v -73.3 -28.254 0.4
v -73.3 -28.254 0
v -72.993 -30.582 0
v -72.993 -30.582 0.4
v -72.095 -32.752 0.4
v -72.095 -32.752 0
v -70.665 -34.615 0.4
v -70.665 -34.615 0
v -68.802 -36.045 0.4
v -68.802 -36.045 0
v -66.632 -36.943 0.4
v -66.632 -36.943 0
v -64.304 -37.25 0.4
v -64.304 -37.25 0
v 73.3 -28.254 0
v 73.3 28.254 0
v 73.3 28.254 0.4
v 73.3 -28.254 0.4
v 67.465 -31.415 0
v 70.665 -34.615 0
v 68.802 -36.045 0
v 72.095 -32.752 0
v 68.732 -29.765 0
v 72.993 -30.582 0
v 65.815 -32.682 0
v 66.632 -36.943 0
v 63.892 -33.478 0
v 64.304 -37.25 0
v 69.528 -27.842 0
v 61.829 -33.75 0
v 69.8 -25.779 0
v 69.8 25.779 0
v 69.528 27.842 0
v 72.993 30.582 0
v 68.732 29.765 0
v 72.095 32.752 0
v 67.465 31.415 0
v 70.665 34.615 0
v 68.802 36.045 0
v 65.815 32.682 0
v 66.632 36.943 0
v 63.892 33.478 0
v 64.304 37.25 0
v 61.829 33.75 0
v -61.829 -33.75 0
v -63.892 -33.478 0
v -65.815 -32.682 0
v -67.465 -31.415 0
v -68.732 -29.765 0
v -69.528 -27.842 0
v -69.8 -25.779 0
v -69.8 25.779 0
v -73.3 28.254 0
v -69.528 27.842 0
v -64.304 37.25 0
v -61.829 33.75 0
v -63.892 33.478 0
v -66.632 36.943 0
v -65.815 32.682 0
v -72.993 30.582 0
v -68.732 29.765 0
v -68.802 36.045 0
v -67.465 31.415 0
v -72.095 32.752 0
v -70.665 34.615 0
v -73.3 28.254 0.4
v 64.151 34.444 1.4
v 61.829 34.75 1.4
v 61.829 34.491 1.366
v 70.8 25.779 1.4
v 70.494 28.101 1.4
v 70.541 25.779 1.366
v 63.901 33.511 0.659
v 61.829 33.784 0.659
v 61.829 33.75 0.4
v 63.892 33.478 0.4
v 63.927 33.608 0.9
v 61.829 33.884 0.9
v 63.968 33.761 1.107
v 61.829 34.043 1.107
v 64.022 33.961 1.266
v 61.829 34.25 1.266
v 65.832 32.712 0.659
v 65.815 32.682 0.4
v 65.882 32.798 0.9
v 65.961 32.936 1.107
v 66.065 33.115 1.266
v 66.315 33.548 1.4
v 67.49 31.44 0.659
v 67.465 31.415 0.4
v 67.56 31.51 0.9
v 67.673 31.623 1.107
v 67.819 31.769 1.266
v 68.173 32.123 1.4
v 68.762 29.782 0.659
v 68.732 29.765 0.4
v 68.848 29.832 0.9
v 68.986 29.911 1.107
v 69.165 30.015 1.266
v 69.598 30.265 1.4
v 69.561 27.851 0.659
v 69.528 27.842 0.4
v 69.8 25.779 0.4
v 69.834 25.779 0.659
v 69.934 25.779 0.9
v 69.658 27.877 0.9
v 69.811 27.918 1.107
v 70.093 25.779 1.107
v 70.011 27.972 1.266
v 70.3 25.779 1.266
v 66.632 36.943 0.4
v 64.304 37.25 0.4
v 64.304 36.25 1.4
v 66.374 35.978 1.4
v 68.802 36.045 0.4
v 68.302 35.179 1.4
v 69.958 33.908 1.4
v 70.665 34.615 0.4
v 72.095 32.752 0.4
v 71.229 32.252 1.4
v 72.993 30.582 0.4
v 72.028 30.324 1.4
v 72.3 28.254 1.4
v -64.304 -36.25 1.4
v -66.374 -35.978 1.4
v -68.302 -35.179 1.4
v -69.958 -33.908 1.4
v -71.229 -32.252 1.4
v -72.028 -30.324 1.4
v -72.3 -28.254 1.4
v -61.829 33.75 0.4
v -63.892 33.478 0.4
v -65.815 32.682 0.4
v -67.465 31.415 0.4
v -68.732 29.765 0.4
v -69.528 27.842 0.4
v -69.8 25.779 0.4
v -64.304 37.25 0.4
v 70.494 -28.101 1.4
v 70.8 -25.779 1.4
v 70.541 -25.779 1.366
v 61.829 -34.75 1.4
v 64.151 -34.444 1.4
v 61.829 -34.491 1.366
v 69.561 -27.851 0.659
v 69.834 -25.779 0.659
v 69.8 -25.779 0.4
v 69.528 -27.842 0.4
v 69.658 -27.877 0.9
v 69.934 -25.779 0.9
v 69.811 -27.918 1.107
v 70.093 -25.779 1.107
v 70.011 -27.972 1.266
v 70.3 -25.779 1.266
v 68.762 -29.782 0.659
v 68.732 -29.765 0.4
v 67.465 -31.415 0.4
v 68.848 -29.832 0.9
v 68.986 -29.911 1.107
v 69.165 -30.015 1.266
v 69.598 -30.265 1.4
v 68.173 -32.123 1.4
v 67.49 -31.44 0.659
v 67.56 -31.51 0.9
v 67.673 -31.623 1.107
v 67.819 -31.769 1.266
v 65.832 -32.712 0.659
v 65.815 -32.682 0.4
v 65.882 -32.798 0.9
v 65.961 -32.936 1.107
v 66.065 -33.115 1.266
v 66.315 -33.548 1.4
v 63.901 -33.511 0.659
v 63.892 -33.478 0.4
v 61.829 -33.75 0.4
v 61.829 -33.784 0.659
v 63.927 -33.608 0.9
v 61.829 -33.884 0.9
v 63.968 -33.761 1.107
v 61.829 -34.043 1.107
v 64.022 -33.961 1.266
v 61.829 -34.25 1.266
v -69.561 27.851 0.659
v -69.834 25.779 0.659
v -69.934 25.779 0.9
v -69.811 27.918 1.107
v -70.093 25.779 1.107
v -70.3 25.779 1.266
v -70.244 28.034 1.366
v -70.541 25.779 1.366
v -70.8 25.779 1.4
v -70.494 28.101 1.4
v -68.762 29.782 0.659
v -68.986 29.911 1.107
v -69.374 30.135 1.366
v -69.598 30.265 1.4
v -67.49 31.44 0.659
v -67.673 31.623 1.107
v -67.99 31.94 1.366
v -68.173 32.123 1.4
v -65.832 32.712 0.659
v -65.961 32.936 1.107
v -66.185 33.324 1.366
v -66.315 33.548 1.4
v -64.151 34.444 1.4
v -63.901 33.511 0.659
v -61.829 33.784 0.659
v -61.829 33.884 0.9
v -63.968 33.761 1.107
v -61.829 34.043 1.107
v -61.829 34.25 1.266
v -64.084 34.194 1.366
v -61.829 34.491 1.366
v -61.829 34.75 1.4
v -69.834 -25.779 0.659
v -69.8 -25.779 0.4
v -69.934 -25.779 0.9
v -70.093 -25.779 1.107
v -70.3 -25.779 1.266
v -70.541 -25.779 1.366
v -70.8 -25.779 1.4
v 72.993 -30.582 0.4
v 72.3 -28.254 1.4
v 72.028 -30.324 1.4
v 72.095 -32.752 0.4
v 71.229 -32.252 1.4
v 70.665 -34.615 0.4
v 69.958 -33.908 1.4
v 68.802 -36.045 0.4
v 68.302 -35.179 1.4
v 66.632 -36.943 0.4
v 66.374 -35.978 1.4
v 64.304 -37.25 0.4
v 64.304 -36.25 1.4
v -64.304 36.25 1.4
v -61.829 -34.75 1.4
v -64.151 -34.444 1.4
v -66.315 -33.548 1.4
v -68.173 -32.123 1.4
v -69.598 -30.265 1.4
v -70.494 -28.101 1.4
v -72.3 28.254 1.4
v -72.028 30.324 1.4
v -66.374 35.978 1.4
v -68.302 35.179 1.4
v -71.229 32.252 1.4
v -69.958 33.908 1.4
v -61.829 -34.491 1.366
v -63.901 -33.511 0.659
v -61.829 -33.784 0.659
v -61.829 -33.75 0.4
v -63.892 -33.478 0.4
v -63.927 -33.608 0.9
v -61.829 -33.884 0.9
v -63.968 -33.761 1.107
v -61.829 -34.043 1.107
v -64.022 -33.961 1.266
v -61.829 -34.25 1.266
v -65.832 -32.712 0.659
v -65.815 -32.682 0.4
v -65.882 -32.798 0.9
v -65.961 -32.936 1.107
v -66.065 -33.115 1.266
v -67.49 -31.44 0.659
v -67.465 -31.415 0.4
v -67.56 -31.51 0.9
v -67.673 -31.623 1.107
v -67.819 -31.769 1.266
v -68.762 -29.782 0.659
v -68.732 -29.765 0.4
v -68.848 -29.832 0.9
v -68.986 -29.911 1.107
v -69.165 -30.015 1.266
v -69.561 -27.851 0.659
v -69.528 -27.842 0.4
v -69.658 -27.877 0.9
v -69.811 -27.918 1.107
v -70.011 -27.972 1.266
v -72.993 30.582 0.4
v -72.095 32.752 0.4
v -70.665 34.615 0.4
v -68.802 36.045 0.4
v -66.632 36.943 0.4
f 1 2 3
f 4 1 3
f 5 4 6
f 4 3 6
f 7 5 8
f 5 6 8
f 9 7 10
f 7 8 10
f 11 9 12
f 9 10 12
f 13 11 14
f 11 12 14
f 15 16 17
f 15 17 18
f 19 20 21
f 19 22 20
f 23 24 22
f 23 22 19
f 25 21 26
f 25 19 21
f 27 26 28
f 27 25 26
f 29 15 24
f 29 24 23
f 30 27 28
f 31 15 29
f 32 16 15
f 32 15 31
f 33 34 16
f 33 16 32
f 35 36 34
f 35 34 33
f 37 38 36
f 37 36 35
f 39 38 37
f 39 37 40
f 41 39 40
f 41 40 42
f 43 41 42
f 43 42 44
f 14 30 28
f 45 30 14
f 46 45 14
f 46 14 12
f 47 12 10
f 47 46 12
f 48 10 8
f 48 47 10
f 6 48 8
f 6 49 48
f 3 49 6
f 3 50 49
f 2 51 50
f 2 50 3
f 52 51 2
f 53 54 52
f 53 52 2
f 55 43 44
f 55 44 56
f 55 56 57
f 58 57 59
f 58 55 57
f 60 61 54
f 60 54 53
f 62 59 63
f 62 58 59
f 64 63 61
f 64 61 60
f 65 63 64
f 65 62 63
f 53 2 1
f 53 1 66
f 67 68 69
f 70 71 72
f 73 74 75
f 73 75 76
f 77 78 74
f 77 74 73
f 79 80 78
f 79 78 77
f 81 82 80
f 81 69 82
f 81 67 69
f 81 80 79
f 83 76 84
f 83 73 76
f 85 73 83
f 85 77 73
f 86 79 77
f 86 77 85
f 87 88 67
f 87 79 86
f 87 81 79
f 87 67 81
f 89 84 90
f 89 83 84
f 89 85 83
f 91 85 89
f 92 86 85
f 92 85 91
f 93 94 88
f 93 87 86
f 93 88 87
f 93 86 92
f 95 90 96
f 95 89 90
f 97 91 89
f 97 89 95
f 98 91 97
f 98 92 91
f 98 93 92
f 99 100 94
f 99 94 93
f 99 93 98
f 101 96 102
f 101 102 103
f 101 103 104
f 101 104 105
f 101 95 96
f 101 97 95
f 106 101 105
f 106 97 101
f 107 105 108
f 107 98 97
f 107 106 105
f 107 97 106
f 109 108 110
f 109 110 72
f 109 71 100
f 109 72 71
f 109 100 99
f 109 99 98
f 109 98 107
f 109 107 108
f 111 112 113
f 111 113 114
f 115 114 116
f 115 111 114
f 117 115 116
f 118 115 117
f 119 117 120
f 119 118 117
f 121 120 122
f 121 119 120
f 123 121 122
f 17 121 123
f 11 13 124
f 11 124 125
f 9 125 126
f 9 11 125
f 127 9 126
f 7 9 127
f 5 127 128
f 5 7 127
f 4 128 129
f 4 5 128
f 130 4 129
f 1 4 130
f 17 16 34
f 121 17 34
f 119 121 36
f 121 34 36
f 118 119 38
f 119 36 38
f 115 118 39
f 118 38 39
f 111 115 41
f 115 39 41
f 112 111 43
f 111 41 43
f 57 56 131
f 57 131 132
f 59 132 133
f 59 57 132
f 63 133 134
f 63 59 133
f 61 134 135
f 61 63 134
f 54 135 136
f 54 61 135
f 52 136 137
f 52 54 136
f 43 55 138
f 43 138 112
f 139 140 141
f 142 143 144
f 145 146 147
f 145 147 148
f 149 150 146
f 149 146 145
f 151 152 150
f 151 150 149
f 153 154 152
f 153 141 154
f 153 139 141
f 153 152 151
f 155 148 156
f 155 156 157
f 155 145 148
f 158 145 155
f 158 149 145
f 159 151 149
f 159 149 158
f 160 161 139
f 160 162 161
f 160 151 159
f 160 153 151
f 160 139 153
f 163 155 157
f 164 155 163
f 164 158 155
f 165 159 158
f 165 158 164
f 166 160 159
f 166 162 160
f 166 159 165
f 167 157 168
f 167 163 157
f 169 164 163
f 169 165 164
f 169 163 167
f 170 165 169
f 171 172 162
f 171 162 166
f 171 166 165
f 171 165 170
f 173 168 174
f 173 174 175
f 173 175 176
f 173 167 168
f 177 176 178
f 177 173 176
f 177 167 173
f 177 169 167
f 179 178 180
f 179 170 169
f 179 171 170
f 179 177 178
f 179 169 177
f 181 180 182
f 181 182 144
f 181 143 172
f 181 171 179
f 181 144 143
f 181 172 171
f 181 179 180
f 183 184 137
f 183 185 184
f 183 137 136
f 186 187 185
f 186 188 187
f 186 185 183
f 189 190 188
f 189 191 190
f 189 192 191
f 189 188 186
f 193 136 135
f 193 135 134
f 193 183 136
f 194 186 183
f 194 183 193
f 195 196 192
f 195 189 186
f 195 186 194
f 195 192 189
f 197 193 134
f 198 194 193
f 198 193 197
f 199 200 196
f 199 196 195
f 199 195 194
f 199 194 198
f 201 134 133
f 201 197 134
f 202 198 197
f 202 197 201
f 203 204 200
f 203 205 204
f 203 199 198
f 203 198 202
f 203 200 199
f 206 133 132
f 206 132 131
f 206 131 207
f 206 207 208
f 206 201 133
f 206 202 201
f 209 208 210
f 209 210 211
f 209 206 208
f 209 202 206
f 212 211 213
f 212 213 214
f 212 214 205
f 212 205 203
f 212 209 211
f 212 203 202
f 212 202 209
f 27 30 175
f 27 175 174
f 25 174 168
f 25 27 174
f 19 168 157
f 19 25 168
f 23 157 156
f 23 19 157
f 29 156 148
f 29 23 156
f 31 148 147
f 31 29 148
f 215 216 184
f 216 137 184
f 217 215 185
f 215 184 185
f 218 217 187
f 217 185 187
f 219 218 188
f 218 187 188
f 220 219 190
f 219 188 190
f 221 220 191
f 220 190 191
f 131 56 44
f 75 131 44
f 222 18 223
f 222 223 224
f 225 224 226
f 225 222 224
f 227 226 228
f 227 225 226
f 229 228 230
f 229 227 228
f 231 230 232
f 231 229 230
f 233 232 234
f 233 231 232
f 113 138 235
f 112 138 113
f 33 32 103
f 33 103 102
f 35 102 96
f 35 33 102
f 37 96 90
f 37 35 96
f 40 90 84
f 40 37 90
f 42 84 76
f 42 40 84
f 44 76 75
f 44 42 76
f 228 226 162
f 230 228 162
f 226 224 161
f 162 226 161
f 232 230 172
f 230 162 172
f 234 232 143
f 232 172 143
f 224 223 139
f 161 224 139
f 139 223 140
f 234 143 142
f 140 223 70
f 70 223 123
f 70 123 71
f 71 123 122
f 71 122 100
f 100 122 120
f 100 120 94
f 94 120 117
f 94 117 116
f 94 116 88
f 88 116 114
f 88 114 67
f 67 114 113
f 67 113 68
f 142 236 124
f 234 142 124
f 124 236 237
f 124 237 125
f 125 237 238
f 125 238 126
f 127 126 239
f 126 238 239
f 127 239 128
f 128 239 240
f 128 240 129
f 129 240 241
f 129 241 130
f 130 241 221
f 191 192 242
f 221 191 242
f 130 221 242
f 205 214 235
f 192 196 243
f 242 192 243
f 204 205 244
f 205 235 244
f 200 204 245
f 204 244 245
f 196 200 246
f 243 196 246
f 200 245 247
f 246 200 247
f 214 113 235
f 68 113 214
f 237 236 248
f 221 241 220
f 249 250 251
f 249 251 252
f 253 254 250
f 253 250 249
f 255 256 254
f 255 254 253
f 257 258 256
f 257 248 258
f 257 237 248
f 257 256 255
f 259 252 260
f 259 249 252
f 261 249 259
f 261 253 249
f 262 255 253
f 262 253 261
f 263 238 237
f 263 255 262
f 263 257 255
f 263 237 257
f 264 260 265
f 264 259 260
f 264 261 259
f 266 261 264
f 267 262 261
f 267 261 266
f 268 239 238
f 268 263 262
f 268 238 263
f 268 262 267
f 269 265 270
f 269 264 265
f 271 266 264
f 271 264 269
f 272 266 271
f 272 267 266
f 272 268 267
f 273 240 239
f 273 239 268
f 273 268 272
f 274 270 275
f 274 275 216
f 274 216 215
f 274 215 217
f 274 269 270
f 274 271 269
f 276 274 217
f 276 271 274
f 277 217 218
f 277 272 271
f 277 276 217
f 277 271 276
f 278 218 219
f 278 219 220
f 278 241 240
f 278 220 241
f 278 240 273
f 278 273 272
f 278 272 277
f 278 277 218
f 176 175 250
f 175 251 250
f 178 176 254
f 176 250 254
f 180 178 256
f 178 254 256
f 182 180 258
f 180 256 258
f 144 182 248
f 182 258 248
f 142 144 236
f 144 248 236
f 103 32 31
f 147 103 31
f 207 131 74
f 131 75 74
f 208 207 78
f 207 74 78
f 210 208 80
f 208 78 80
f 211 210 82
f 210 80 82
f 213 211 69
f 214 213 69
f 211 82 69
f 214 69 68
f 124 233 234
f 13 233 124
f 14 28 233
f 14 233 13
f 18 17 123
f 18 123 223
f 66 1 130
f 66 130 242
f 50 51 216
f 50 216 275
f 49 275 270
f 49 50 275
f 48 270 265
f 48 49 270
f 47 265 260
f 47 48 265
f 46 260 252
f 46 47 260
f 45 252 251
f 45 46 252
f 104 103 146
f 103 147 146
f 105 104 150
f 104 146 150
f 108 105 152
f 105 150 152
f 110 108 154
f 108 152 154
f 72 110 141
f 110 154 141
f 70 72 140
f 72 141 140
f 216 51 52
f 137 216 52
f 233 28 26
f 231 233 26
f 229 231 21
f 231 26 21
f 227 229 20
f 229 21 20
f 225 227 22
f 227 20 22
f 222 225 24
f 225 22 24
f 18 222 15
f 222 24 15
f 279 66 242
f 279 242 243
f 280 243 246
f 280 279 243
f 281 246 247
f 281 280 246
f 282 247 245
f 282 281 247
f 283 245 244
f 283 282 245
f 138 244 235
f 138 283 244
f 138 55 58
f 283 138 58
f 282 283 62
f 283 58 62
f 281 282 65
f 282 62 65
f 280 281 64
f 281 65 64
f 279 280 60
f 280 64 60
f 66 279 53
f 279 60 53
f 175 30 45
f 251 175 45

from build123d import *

# Parameters (mm, degrees)
PAD002_DEPTH = 1.4
FILLET_R     = 1
CHAMFER_SIZE = 1


with BuildPart() as part:
    # Sketch003 → Pad002 (new body)
    with BuildSketch(Plane.XY):
        with BuildLine():
            Line((-64.304214, 37.25), (64.304214, 37.25))
            ThreePointArc((73.3, 28.254214), (70.665195, 34.615195), (64.304214, 37.25))
            Line((73.3, 28.254214), (73.3, -28.254214))
            ThreePointArc((64.304214, -37.25), (70.665195, -34.615195), (73.3, -28.254214))
            Line((64.304214, -37.25), (-64.304214, -37.25))
            ThreePointArc((-73.3, -28.254214), (-70.665195, -34.615195), (-64.304214, -37.25))
            Line((-73.3, -28.254214), (-73.3, 28.254214))
            ThreePointArc((-64.304214, 37.25), (-70.665195, 34.615195), (-73.3, 28.254214))
        make_face()
        with BuildLine():
            Line((-61.82934, 33.75), (61.82934, 33.75))
            ThreePointArc((69.8, 25.77934), (67.465448, 31.415448), (61.82934, 33.75))
            Line((69.8, 25.77934), (69.8, -25.77934))
            ThreePointArc((61.82934, -33.75), (67.465448, -31.415448), (69.8, -25.77934))
            Line((61.82934, -33.75), (-61.82934, -33.75))
            ThreePointArc((-69.8, -25.77934), (-67.465448, -31.415448), (-61.82934, -33.75))
            Line((-69.8, -25.77934), (-69.8, 25.77934))
            ThreePointArc((-61.82934, 33.75), (-67.465448, 31.415448), (-69.8, 25.77934))
        make_face(mode=Mode.SUBTRACT)
    extrude(amount=PAD002_DEPTH)

    # Fillet
    fillet_edges = [part.edges().sort_by_distance(p)[0] for p in [
        (0, 33.75, 1.4),
        (-67.465448, 31.415448, 1.4),
        (-69.8, 0, 1.4),
        (-67.465448, -31.415448, 1.4),
        (0, -33.75, 1.4),
        (67.465448, -31.415448, 1.4),
        (69.8, 0, 1.4),
        (67.465448, 31.415448, 1.4),
    ]]
    fillet(fillet_edges, radius=FILLET_R)

    # Chamfer
    chamfer_edges = [part.edges().sort_by_distance(p)[0] for p in [
        (0, 37.25, 1.4),
        (70.665195, 34.615195, 1.4),
        (73.3, 0, 1.4),
        (70.665195, -34.615195, 1.4),
        (0, -37.25, 1.4),
        (-70.665195, -34.615195, 1.4),
        (-73.3, 0, 1.4),
        (-70.665195, 34.615195, 1.4),
    ]]
    chamfer(chamfer_edges, length=CHAMFER_SIZE)


solid = part.part
